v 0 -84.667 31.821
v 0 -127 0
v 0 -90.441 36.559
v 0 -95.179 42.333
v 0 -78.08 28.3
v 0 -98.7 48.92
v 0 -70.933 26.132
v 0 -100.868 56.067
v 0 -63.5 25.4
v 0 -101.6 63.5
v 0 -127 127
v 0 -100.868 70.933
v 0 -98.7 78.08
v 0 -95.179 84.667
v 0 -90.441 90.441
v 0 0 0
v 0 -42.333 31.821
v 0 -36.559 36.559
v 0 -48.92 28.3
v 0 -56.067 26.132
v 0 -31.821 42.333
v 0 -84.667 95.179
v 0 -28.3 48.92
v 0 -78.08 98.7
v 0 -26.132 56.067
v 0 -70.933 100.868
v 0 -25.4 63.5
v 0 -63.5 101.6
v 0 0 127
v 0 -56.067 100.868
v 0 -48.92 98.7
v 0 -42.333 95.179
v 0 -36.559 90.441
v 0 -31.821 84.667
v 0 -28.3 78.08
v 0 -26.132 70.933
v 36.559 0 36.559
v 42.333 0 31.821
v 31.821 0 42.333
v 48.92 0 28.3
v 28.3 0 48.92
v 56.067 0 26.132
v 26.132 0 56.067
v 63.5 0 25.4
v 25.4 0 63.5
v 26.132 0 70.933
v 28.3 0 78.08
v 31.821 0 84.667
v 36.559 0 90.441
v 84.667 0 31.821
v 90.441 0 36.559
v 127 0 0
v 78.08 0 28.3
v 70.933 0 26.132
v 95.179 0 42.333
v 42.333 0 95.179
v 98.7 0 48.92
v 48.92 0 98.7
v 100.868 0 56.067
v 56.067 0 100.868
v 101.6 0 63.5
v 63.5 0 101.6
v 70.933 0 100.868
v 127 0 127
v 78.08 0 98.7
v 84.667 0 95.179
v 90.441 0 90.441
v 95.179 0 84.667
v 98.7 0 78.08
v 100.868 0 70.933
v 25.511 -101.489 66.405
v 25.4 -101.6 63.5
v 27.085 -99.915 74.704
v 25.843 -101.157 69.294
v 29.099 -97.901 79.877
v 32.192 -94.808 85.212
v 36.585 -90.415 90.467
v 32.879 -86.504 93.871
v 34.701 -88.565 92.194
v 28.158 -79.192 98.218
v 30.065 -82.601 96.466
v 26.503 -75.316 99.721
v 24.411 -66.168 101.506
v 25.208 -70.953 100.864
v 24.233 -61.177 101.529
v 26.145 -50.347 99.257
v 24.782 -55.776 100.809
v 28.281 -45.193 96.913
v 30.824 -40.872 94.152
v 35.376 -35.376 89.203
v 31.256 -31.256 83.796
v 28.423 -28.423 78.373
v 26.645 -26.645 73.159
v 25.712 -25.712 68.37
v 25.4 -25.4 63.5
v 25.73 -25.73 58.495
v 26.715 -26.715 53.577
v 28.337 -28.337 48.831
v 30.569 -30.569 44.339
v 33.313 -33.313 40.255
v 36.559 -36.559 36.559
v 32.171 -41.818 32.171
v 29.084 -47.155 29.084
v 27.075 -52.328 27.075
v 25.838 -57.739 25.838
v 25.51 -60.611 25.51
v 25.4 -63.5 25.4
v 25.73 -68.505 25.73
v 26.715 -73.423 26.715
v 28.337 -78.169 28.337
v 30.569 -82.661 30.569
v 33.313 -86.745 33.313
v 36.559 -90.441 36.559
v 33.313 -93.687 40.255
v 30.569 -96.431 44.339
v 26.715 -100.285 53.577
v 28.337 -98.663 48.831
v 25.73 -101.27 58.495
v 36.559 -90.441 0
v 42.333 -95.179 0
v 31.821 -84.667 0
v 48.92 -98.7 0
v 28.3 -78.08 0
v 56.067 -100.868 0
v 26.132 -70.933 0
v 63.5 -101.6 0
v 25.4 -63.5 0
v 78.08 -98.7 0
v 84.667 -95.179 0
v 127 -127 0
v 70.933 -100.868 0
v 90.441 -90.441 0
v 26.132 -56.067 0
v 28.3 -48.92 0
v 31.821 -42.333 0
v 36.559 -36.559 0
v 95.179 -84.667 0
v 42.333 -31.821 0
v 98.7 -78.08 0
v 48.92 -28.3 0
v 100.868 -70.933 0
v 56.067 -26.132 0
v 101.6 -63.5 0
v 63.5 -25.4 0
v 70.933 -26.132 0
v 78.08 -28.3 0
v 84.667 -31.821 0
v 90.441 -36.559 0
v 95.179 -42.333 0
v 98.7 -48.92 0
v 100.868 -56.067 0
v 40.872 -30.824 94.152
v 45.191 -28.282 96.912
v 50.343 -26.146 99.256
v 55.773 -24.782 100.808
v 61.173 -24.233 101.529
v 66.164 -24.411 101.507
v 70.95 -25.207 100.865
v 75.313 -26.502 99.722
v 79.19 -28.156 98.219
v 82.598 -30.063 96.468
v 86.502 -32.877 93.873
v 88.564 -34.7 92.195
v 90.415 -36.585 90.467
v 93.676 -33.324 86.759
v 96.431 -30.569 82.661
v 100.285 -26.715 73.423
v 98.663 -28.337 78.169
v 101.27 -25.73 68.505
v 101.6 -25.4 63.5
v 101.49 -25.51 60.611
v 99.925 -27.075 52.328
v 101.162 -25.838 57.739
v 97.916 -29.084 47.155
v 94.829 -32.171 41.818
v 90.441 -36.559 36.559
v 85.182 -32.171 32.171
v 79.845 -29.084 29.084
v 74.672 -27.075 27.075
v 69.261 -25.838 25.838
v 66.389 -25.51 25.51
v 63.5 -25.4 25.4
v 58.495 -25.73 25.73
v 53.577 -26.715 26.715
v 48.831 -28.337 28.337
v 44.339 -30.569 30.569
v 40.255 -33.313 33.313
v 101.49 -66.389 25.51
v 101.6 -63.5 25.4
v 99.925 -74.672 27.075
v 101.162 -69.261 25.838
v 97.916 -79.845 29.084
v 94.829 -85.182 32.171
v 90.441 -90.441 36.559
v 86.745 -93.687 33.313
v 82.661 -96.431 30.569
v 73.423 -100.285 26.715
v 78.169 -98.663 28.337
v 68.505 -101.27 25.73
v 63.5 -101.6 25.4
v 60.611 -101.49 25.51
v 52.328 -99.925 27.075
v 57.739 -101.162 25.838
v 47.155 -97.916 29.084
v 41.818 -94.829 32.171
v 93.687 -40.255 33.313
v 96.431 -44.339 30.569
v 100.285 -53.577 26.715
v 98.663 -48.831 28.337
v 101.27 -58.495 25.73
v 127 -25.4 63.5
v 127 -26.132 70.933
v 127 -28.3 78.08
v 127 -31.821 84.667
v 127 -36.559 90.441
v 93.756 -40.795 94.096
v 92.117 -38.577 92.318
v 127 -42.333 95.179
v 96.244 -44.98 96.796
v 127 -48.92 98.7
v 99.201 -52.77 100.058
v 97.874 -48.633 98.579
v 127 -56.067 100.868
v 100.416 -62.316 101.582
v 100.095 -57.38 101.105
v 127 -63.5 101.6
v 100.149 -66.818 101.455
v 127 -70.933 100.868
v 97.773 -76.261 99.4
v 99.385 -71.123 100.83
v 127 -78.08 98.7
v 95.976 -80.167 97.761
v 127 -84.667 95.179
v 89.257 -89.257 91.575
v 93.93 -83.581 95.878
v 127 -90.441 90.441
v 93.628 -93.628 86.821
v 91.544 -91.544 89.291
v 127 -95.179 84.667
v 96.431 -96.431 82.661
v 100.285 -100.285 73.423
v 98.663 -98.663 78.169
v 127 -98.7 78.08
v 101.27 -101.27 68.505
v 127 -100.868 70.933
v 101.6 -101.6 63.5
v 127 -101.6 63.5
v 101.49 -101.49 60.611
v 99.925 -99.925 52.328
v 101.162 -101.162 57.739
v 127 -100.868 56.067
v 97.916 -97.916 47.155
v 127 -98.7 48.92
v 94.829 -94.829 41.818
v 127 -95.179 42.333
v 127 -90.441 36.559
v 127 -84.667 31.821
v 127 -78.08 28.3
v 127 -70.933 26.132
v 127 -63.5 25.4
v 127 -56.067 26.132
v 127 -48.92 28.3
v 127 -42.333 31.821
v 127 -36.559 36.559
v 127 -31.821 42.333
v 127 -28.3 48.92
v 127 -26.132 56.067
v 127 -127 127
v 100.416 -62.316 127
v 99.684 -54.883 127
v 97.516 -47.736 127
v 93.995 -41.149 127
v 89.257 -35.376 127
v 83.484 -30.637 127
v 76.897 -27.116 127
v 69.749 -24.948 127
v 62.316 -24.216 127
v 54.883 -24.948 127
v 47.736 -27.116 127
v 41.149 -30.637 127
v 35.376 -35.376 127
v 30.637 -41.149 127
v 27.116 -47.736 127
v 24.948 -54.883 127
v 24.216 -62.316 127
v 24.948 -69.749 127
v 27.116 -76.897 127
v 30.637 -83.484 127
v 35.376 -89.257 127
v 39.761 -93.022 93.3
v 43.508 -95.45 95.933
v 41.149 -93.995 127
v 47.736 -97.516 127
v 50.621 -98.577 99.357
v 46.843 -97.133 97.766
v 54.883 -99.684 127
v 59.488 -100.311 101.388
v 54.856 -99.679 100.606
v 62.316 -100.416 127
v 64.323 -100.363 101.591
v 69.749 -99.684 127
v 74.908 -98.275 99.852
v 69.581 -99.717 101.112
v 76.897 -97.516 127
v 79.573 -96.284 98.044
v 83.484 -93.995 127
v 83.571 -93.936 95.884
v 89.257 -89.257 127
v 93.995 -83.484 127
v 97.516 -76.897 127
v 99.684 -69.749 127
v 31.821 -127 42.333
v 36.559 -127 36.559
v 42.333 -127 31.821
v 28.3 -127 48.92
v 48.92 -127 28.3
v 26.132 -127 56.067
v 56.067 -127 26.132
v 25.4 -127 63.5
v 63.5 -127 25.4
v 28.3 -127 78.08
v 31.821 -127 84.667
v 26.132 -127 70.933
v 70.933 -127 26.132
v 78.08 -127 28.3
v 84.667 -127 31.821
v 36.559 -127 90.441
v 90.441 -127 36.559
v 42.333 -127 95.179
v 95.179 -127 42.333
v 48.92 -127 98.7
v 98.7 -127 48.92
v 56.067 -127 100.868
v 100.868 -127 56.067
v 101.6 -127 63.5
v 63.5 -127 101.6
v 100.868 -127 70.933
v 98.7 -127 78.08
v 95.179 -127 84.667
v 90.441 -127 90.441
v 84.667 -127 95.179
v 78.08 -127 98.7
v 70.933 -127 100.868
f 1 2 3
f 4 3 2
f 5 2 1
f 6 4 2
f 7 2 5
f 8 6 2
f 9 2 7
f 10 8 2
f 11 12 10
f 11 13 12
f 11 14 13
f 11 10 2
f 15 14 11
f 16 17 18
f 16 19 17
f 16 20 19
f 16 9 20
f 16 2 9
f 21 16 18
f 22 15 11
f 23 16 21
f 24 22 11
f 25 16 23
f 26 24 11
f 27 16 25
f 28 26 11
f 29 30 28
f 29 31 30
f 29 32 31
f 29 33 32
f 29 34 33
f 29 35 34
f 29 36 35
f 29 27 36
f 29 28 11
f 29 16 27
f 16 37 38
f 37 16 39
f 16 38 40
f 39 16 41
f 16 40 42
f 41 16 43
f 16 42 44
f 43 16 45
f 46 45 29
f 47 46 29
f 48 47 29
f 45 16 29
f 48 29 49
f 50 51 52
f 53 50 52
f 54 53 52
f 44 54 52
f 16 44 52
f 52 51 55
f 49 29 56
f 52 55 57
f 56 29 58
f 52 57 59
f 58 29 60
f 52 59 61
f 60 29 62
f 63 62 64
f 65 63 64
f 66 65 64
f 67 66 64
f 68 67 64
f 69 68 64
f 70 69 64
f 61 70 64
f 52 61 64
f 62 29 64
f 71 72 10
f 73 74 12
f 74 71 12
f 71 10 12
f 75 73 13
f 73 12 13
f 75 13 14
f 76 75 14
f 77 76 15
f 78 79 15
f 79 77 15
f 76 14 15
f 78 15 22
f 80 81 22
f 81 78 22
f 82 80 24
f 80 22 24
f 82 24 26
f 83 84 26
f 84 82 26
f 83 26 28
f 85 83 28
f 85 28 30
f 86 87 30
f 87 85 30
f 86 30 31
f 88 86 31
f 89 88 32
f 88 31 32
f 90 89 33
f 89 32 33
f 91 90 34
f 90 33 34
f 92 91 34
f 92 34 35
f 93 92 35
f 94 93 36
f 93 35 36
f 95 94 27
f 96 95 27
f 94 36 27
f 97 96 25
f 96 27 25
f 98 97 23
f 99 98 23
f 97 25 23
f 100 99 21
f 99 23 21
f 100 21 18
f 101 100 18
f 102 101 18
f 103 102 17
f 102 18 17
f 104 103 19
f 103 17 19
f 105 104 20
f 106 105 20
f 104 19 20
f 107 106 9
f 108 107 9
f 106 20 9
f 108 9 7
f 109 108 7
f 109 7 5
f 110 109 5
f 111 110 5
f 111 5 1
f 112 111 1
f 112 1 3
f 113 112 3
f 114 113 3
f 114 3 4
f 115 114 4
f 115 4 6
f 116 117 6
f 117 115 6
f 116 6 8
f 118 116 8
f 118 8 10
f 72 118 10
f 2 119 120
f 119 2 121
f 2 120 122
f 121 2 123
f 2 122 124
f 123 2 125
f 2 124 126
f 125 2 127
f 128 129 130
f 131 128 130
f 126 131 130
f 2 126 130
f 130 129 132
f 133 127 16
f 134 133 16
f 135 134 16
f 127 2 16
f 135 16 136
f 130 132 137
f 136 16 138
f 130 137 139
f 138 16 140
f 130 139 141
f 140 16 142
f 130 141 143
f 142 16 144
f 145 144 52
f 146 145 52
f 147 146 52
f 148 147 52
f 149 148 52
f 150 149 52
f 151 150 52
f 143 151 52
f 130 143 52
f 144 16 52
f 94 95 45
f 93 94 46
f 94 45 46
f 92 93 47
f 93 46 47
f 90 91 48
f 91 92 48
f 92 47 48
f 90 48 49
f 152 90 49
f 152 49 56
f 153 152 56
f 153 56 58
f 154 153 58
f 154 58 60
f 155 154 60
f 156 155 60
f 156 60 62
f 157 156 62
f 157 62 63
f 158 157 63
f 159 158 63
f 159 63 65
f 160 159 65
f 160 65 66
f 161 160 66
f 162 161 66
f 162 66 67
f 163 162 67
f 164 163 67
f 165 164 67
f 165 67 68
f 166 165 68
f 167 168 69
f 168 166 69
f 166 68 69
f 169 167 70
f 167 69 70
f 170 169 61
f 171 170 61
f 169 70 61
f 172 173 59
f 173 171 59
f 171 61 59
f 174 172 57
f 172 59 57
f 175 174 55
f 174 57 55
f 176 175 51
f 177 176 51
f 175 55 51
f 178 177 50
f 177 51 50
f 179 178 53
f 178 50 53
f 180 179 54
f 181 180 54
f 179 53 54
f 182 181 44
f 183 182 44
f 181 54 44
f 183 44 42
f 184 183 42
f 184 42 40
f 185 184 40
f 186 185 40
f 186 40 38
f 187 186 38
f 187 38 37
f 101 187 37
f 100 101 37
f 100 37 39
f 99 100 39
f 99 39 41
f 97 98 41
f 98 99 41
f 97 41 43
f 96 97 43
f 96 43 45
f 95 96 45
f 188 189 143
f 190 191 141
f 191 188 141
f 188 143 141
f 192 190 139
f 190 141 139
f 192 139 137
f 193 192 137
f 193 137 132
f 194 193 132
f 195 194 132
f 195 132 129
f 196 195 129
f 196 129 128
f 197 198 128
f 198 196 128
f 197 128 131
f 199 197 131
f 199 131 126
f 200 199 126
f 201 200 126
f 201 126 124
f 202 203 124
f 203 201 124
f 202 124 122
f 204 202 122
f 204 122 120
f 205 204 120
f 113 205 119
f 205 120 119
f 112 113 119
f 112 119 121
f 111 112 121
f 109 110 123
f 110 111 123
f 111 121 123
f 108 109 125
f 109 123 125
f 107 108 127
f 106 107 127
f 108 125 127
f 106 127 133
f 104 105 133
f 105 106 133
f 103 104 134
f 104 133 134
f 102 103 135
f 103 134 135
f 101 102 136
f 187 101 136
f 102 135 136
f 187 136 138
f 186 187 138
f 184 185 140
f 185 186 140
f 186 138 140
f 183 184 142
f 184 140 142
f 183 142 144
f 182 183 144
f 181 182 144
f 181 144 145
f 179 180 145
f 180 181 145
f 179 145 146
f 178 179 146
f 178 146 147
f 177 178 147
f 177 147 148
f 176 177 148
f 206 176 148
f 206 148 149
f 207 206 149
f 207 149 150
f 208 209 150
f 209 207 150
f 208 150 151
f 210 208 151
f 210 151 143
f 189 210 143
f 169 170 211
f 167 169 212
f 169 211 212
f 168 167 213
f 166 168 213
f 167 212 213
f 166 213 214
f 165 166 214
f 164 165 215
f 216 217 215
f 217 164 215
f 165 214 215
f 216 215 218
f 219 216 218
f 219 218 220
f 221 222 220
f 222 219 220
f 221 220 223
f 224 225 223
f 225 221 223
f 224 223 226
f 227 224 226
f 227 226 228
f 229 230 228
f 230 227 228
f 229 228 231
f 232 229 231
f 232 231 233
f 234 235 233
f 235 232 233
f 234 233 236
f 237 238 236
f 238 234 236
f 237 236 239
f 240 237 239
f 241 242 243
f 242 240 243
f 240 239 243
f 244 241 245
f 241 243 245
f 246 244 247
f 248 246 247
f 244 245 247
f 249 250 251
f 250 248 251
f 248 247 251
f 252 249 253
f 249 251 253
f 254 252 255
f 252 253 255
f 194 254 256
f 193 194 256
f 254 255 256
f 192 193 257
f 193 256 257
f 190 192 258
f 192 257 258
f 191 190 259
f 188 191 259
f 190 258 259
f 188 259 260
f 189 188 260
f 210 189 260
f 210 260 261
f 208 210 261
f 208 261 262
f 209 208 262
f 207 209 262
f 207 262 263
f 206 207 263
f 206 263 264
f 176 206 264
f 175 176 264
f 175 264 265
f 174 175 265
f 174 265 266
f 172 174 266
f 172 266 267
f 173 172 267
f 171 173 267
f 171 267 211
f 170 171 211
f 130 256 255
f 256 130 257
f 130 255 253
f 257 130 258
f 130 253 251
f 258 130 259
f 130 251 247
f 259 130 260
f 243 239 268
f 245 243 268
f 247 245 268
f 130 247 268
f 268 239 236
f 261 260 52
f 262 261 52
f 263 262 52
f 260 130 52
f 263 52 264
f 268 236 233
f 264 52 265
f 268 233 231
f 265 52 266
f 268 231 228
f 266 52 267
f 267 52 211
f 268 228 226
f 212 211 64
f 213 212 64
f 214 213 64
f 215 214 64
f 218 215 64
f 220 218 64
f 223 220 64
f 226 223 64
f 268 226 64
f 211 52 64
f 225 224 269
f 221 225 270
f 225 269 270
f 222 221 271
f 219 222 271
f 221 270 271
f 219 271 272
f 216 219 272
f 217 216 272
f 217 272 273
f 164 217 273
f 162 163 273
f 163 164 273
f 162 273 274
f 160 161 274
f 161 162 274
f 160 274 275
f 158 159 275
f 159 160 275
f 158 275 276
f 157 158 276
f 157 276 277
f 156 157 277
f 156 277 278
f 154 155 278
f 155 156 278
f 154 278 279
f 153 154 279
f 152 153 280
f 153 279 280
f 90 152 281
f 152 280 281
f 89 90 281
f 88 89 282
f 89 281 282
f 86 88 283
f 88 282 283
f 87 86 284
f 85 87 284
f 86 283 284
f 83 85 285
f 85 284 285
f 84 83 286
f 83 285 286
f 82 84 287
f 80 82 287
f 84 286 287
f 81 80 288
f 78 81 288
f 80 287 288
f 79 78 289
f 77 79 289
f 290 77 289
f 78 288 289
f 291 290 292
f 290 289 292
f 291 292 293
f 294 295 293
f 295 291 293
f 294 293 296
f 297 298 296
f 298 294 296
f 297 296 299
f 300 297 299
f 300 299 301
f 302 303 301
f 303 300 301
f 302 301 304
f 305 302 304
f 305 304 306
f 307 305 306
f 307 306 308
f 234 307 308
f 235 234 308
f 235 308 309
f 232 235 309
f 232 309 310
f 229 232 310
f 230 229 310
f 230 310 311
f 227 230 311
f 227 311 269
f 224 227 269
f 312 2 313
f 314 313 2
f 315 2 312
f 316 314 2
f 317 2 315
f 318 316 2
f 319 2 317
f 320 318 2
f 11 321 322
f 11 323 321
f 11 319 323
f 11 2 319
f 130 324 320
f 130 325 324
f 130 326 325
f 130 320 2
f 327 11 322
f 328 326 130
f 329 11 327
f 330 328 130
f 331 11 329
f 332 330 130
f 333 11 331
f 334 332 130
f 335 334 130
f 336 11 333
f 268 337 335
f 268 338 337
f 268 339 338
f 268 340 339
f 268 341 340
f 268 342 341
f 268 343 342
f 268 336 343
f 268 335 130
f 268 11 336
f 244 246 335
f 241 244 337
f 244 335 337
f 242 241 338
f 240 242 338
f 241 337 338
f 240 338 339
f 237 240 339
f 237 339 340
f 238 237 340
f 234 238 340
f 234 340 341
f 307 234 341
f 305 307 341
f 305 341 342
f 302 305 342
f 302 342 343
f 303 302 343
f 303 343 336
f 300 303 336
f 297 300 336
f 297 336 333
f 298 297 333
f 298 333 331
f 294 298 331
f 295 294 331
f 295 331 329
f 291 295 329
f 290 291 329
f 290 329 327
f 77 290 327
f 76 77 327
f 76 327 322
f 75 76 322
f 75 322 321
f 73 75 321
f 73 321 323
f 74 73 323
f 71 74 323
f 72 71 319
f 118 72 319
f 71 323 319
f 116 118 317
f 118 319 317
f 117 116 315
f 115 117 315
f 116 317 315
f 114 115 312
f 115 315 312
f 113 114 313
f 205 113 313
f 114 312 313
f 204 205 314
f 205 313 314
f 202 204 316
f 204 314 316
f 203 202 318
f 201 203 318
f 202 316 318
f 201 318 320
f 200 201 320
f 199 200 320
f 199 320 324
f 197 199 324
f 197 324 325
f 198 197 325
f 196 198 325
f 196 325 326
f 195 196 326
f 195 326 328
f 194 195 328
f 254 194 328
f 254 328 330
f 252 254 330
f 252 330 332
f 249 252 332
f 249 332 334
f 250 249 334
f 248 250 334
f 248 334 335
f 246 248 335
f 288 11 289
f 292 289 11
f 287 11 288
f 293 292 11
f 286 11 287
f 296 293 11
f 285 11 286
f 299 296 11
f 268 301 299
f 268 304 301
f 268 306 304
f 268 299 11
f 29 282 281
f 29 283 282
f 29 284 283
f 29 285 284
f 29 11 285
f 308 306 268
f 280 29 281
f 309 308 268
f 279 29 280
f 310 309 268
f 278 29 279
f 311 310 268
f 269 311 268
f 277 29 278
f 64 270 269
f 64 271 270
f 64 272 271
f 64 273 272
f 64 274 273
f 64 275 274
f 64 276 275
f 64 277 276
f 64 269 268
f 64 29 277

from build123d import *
from build123d import SkipClean  # not in build123d's __all__

# Parameters (mm, degrees)
F0_W      = 127
F0_H      = 127
F1_DEPTH  = 127
F2_R      = 38.1
F3_DEPTH  = 76.2
F4_R      = 38.1
F6_DEPTH  = 76.2
F7_R      = 38.1
F9_DEPTH  = 76.2
F10_R     = 38.1
F11_DEPTH = 76.2
F12_R     = 38.1
F13_DEPTH = 76.2
F14_R     = 38.1
F15_DEPTH = 76.2


with BuildPart() as f1:
    # F0 (on Front) → F1 (new body)
    with BuildSketch(Plane.XZ):
        with Locations((63.5, 63.5)):
            Rectangle(F0_W, F0_H)
    extrude(amount=F1_DEPTH)

    # F2 (on face) → F3 (cut)
    with BuildSketch(Plane.XZ.offset(127)):
        with Locations((63.5, 63.5)):
            Circle(F2_R)
    extrude(amount=-F3_DEPTH, mode=Mode.SUBTRACT)

    # F4 (on face) → F6 (cut)
    with BuildSketch(Plane(origin=(0, 0, 0), x_dir=(0, -1, 0), z_dir=(-1, 0, 0))):
        with Locations((63.5, 63.5)):
            Circle(F4_R)
    extrude(amount=-F6_DEPTH, mode=Mode.SUBTRACT)

    # F7 (on face) → F9 (cut)
    with BuildSketch(Plane.YZ.offset(127)):
        with Locations((-63.5, 63.5)):
            Circle(F7_R)
    with SkipClean():  # cleaning this boolean's faces spoils the solid; the shape is the same uncleaned
        extrude(amount=-F9_DEPTH, mode=Mode.SUBTRACT)

    # F10 (on face) → F11 (cut)
    with BuildSketch(Plane(origin=(0, 0, 0), x_dir=(-1, 0, 0), z_dir=(0, 1, 0))):
        with Locations((-63.5, 63.5)):
            Circle(F10_R)
    extrude(amount=-F11_DEPTH, mode=Mode.SUBTRACT)

    # F12 (on face) → F13 (cut)
    with BuildSketch(Plane.XY.offset(127)):
        with Locations((62.3162926857, -62.3162926857)):
            Circle(F12_R)
    extrude(amount=-F13_DEPTH, mode=Mode.SUBTRACT)

    # F14 (on face) → F15 (cut)
    with BuildSketch(Plane(origin=(0, 0, 0), x_dir=(1, 0, 0), z_dir=(0, 0, -1))):
        with Locations((63.5, 63.5)):
            Circle(F14_R)
    extrude(amount=-F15_DEPTH, mode=Mode.SUBTRACT)


solid = f1.part
